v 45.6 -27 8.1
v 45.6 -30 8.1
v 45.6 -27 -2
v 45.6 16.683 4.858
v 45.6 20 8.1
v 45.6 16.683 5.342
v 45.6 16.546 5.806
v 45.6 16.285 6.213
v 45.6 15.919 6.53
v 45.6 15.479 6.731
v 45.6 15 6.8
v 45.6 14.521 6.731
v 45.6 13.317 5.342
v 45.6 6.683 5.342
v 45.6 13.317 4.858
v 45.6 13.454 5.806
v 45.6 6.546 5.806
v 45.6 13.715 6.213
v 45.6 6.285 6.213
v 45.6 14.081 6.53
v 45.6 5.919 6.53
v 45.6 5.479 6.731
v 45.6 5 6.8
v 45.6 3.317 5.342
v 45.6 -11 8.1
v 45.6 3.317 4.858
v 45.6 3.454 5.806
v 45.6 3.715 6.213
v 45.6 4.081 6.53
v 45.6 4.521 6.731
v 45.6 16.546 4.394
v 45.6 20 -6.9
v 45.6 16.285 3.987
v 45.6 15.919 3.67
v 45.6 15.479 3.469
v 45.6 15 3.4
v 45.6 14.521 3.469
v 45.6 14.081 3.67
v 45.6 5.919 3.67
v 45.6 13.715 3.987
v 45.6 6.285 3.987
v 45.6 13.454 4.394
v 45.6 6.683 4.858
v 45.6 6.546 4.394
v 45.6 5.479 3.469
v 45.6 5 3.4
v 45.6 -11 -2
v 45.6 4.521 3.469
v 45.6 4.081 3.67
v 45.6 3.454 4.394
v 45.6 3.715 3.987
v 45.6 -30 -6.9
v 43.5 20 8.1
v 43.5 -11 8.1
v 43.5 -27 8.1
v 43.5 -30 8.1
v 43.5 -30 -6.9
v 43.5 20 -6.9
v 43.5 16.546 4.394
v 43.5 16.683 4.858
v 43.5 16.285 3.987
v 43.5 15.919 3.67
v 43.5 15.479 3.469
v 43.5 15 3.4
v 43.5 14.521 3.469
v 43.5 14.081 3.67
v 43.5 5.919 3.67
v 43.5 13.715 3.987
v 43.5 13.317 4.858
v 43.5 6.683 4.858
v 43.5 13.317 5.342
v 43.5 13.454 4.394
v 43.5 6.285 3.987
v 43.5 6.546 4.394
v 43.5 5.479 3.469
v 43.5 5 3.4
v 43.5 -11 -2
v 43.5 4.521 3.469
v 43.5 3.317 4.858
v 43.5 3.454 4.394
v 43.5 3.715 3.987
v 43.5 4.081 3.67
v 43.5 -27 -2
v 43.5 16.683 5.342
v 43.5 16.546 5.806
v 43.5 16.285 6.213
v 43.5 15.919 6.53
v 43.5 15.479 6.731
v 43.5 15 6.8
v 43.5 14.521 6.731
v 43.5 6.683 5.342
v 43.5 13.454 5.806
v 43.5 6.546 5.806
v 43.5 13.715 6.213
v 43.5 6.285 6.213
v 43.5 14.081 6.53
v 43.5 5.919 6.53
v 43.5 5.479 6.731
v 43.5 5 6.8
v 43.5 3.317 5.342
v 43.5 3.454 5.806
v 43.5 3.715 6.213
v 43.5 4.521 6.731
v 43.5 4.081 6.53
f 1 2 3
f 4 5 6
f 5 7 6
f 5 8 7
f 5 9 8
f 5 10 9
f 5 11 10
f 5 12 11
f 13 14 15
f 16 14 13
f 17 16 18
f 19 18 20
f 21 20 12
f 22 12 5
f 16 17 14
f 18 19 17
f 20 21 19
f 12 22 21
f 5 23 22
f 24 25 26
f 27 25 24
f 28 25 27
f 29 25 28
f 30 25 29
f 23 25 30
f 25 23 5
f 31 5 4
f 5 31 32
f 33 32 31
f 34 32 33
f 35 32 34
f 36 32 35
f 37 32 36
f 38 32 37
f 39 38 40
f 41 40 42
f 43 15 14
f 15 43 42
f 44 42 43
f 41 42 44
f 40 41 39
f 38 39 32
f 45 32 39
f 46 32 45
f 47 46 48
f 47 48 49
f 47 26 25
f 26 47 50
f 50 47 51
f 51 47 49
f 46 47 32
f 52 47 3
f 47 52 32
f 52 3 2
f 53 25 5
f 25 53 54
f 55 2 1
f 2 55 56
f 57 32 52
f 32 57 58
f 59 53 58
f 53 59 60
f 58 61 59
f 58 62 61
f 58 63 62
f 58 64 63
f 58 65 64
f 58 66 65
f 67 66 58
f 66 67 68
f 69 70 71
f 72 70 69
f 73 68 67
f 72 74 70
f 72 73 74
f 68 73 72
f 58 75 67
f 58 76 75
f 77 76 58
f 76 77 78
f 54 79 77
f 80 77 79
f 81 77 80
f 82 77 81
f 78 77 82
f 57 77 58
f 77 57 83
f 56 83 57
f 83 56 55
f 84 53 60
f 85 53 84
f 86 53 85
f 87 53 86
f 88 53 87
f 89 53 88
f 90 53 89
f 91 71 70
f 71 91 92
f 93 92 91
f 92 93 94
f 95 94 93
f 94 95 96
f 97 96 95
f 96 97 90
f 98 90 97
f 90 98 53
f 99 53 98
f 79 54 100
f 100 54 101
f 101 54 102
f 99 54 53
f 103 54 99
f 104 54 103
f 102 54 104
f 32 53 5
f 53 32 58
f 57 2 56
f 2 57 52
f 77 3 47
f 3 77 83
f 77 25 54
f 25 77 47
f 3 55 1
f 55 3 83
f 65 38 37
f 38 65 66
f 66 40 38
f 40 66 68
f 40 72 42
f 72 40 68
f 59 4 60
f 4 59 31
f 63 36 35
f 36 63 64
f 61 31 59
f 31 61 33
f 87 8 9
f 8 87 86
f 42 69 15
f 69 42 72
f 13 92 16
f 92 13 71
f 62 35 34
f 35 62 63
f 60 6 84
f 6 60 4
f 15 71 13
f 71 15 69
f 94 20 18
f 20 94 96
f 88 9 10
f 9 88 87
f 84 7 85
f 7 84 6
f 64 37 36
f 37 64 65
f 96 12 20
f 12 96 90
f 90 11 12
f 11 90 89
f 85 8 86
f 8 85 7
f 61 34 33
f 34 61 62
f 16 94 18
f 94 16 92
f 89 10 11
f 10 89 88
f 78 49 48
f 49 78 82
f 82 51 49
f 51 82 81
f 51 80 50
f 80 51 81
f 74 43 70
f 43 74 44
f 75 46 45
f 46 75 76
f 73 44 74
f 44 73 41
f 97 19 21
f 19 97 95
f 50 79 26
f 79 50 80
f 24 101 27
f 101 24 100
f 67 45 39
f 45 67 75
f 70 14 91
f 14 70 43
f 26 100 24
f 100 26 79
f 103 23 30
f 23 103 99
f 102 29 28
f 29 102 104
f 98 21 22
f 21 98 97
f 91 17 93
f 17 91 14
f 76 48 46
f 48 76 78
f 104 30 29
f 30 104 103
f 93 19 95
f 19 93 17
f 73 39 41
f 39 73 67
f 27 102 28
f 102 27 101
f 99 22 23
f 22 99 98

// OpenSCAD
// file: ../Parts/rounder.scad
// rounder.scad
// cutting tool for rounding off corners with a cylinder

//---------------------
module rounder(
r=10,   // radius
h=10,   // height
f=22,    // $fn
extra=0.01  // extra size for the cube
){

difference(){
  translate([-extra,-extra,-extra])
  cube([r+extra,r+extra,h+2*extra]);
  translate([r,r,-1])
  cylinder(r=r,h=h+2,$fn=f);
}

}

//---------------------------------------------------------------------------
module bevel(x=1,y=1,h=10){

linear_extrude(height=h)
polygon(points=[[0,0],[x,0],[0,y]]);
    
}
  

//========================

rounder();

//========================
// main file
//=================================================================================
// RibbonJig.scad
// 
// Holder for a ribbon on the sewing machine for monogramming
//
// Dr Tom Flint, 17 Dec 2023
//=================================================================================


use <../Parts/rounder.scad>

thick = 2.1;

x0=87;      // length of the beam
y0=20;      // width of the beam

y1=16;          // width of the ribbon

y2=50;      // width of the foot
z2=15;      // height of foot
z3=6;       // height of the lip

//---------------------------------------------------------------------------------
module beam(){

  difference(){
    union(){
      translate([0,y0/2,thick/2])
      cube([x0,y0,thick],center=true);

      translate([x0/2-thick/2,y0/2,thick+z3/2])
      cube([thick,y0,z3],center=true);

      translate([-(x0/2-thick/2),y0/2,thick+z3/2])
      cube([thick,y0,z3],center=true);
    }
      
    translate([0,y0/2+0.25*y0,thick+z3/2])
    rotate([0,90,0])
    cylinder(r=1.7,h=x0+20,center=true,$fn=22);

    translate([0,y0/2-0.25*y0,thick+z3/2])
    rotate([0,90,0])
    cylinder(r=1.7,h=x0+20,center=true,$fn=22);

    // magnet cuts
    translate([(x0/2-thick/2-15),y0/2,1+0.3])
    cube([6.15,10.15,2.0],center=true);

    translate([-(x0/2-thick/2-15),y0/2,1+0.3])
    cube([6.15,10.15,2.0],center=true);

  }
  
}
 
//---------------------------------------------------------------------------------
module foot(){

  difference(){
    // main foot
    translate([x0/2+thick/2,-5,-z2/2+thick+z3])
    cube([thick,y2,z2],center=true);

    // ribbon cut
    translate([x0/2+thick/2,-19,z2/2-2])
    cube([thick+2,y1,z2],center=true);

    // bolts
    translate([0,y0/2+0.25*y0,thick+z3/2])
    rotate([0,90,0])
    cylinder(r=1.7,h=x0+20,center=true,$fn=22);

    translate([0,y0/2-0.25*y0,thick+z3/2])
    rotate([0,90,0])
    cylinder(r=1.7,h=x0+20,center=true,$fn=22);

  }

}

//=================================================================================

//~ beam();

foot();

//=================================================================================



 
  
